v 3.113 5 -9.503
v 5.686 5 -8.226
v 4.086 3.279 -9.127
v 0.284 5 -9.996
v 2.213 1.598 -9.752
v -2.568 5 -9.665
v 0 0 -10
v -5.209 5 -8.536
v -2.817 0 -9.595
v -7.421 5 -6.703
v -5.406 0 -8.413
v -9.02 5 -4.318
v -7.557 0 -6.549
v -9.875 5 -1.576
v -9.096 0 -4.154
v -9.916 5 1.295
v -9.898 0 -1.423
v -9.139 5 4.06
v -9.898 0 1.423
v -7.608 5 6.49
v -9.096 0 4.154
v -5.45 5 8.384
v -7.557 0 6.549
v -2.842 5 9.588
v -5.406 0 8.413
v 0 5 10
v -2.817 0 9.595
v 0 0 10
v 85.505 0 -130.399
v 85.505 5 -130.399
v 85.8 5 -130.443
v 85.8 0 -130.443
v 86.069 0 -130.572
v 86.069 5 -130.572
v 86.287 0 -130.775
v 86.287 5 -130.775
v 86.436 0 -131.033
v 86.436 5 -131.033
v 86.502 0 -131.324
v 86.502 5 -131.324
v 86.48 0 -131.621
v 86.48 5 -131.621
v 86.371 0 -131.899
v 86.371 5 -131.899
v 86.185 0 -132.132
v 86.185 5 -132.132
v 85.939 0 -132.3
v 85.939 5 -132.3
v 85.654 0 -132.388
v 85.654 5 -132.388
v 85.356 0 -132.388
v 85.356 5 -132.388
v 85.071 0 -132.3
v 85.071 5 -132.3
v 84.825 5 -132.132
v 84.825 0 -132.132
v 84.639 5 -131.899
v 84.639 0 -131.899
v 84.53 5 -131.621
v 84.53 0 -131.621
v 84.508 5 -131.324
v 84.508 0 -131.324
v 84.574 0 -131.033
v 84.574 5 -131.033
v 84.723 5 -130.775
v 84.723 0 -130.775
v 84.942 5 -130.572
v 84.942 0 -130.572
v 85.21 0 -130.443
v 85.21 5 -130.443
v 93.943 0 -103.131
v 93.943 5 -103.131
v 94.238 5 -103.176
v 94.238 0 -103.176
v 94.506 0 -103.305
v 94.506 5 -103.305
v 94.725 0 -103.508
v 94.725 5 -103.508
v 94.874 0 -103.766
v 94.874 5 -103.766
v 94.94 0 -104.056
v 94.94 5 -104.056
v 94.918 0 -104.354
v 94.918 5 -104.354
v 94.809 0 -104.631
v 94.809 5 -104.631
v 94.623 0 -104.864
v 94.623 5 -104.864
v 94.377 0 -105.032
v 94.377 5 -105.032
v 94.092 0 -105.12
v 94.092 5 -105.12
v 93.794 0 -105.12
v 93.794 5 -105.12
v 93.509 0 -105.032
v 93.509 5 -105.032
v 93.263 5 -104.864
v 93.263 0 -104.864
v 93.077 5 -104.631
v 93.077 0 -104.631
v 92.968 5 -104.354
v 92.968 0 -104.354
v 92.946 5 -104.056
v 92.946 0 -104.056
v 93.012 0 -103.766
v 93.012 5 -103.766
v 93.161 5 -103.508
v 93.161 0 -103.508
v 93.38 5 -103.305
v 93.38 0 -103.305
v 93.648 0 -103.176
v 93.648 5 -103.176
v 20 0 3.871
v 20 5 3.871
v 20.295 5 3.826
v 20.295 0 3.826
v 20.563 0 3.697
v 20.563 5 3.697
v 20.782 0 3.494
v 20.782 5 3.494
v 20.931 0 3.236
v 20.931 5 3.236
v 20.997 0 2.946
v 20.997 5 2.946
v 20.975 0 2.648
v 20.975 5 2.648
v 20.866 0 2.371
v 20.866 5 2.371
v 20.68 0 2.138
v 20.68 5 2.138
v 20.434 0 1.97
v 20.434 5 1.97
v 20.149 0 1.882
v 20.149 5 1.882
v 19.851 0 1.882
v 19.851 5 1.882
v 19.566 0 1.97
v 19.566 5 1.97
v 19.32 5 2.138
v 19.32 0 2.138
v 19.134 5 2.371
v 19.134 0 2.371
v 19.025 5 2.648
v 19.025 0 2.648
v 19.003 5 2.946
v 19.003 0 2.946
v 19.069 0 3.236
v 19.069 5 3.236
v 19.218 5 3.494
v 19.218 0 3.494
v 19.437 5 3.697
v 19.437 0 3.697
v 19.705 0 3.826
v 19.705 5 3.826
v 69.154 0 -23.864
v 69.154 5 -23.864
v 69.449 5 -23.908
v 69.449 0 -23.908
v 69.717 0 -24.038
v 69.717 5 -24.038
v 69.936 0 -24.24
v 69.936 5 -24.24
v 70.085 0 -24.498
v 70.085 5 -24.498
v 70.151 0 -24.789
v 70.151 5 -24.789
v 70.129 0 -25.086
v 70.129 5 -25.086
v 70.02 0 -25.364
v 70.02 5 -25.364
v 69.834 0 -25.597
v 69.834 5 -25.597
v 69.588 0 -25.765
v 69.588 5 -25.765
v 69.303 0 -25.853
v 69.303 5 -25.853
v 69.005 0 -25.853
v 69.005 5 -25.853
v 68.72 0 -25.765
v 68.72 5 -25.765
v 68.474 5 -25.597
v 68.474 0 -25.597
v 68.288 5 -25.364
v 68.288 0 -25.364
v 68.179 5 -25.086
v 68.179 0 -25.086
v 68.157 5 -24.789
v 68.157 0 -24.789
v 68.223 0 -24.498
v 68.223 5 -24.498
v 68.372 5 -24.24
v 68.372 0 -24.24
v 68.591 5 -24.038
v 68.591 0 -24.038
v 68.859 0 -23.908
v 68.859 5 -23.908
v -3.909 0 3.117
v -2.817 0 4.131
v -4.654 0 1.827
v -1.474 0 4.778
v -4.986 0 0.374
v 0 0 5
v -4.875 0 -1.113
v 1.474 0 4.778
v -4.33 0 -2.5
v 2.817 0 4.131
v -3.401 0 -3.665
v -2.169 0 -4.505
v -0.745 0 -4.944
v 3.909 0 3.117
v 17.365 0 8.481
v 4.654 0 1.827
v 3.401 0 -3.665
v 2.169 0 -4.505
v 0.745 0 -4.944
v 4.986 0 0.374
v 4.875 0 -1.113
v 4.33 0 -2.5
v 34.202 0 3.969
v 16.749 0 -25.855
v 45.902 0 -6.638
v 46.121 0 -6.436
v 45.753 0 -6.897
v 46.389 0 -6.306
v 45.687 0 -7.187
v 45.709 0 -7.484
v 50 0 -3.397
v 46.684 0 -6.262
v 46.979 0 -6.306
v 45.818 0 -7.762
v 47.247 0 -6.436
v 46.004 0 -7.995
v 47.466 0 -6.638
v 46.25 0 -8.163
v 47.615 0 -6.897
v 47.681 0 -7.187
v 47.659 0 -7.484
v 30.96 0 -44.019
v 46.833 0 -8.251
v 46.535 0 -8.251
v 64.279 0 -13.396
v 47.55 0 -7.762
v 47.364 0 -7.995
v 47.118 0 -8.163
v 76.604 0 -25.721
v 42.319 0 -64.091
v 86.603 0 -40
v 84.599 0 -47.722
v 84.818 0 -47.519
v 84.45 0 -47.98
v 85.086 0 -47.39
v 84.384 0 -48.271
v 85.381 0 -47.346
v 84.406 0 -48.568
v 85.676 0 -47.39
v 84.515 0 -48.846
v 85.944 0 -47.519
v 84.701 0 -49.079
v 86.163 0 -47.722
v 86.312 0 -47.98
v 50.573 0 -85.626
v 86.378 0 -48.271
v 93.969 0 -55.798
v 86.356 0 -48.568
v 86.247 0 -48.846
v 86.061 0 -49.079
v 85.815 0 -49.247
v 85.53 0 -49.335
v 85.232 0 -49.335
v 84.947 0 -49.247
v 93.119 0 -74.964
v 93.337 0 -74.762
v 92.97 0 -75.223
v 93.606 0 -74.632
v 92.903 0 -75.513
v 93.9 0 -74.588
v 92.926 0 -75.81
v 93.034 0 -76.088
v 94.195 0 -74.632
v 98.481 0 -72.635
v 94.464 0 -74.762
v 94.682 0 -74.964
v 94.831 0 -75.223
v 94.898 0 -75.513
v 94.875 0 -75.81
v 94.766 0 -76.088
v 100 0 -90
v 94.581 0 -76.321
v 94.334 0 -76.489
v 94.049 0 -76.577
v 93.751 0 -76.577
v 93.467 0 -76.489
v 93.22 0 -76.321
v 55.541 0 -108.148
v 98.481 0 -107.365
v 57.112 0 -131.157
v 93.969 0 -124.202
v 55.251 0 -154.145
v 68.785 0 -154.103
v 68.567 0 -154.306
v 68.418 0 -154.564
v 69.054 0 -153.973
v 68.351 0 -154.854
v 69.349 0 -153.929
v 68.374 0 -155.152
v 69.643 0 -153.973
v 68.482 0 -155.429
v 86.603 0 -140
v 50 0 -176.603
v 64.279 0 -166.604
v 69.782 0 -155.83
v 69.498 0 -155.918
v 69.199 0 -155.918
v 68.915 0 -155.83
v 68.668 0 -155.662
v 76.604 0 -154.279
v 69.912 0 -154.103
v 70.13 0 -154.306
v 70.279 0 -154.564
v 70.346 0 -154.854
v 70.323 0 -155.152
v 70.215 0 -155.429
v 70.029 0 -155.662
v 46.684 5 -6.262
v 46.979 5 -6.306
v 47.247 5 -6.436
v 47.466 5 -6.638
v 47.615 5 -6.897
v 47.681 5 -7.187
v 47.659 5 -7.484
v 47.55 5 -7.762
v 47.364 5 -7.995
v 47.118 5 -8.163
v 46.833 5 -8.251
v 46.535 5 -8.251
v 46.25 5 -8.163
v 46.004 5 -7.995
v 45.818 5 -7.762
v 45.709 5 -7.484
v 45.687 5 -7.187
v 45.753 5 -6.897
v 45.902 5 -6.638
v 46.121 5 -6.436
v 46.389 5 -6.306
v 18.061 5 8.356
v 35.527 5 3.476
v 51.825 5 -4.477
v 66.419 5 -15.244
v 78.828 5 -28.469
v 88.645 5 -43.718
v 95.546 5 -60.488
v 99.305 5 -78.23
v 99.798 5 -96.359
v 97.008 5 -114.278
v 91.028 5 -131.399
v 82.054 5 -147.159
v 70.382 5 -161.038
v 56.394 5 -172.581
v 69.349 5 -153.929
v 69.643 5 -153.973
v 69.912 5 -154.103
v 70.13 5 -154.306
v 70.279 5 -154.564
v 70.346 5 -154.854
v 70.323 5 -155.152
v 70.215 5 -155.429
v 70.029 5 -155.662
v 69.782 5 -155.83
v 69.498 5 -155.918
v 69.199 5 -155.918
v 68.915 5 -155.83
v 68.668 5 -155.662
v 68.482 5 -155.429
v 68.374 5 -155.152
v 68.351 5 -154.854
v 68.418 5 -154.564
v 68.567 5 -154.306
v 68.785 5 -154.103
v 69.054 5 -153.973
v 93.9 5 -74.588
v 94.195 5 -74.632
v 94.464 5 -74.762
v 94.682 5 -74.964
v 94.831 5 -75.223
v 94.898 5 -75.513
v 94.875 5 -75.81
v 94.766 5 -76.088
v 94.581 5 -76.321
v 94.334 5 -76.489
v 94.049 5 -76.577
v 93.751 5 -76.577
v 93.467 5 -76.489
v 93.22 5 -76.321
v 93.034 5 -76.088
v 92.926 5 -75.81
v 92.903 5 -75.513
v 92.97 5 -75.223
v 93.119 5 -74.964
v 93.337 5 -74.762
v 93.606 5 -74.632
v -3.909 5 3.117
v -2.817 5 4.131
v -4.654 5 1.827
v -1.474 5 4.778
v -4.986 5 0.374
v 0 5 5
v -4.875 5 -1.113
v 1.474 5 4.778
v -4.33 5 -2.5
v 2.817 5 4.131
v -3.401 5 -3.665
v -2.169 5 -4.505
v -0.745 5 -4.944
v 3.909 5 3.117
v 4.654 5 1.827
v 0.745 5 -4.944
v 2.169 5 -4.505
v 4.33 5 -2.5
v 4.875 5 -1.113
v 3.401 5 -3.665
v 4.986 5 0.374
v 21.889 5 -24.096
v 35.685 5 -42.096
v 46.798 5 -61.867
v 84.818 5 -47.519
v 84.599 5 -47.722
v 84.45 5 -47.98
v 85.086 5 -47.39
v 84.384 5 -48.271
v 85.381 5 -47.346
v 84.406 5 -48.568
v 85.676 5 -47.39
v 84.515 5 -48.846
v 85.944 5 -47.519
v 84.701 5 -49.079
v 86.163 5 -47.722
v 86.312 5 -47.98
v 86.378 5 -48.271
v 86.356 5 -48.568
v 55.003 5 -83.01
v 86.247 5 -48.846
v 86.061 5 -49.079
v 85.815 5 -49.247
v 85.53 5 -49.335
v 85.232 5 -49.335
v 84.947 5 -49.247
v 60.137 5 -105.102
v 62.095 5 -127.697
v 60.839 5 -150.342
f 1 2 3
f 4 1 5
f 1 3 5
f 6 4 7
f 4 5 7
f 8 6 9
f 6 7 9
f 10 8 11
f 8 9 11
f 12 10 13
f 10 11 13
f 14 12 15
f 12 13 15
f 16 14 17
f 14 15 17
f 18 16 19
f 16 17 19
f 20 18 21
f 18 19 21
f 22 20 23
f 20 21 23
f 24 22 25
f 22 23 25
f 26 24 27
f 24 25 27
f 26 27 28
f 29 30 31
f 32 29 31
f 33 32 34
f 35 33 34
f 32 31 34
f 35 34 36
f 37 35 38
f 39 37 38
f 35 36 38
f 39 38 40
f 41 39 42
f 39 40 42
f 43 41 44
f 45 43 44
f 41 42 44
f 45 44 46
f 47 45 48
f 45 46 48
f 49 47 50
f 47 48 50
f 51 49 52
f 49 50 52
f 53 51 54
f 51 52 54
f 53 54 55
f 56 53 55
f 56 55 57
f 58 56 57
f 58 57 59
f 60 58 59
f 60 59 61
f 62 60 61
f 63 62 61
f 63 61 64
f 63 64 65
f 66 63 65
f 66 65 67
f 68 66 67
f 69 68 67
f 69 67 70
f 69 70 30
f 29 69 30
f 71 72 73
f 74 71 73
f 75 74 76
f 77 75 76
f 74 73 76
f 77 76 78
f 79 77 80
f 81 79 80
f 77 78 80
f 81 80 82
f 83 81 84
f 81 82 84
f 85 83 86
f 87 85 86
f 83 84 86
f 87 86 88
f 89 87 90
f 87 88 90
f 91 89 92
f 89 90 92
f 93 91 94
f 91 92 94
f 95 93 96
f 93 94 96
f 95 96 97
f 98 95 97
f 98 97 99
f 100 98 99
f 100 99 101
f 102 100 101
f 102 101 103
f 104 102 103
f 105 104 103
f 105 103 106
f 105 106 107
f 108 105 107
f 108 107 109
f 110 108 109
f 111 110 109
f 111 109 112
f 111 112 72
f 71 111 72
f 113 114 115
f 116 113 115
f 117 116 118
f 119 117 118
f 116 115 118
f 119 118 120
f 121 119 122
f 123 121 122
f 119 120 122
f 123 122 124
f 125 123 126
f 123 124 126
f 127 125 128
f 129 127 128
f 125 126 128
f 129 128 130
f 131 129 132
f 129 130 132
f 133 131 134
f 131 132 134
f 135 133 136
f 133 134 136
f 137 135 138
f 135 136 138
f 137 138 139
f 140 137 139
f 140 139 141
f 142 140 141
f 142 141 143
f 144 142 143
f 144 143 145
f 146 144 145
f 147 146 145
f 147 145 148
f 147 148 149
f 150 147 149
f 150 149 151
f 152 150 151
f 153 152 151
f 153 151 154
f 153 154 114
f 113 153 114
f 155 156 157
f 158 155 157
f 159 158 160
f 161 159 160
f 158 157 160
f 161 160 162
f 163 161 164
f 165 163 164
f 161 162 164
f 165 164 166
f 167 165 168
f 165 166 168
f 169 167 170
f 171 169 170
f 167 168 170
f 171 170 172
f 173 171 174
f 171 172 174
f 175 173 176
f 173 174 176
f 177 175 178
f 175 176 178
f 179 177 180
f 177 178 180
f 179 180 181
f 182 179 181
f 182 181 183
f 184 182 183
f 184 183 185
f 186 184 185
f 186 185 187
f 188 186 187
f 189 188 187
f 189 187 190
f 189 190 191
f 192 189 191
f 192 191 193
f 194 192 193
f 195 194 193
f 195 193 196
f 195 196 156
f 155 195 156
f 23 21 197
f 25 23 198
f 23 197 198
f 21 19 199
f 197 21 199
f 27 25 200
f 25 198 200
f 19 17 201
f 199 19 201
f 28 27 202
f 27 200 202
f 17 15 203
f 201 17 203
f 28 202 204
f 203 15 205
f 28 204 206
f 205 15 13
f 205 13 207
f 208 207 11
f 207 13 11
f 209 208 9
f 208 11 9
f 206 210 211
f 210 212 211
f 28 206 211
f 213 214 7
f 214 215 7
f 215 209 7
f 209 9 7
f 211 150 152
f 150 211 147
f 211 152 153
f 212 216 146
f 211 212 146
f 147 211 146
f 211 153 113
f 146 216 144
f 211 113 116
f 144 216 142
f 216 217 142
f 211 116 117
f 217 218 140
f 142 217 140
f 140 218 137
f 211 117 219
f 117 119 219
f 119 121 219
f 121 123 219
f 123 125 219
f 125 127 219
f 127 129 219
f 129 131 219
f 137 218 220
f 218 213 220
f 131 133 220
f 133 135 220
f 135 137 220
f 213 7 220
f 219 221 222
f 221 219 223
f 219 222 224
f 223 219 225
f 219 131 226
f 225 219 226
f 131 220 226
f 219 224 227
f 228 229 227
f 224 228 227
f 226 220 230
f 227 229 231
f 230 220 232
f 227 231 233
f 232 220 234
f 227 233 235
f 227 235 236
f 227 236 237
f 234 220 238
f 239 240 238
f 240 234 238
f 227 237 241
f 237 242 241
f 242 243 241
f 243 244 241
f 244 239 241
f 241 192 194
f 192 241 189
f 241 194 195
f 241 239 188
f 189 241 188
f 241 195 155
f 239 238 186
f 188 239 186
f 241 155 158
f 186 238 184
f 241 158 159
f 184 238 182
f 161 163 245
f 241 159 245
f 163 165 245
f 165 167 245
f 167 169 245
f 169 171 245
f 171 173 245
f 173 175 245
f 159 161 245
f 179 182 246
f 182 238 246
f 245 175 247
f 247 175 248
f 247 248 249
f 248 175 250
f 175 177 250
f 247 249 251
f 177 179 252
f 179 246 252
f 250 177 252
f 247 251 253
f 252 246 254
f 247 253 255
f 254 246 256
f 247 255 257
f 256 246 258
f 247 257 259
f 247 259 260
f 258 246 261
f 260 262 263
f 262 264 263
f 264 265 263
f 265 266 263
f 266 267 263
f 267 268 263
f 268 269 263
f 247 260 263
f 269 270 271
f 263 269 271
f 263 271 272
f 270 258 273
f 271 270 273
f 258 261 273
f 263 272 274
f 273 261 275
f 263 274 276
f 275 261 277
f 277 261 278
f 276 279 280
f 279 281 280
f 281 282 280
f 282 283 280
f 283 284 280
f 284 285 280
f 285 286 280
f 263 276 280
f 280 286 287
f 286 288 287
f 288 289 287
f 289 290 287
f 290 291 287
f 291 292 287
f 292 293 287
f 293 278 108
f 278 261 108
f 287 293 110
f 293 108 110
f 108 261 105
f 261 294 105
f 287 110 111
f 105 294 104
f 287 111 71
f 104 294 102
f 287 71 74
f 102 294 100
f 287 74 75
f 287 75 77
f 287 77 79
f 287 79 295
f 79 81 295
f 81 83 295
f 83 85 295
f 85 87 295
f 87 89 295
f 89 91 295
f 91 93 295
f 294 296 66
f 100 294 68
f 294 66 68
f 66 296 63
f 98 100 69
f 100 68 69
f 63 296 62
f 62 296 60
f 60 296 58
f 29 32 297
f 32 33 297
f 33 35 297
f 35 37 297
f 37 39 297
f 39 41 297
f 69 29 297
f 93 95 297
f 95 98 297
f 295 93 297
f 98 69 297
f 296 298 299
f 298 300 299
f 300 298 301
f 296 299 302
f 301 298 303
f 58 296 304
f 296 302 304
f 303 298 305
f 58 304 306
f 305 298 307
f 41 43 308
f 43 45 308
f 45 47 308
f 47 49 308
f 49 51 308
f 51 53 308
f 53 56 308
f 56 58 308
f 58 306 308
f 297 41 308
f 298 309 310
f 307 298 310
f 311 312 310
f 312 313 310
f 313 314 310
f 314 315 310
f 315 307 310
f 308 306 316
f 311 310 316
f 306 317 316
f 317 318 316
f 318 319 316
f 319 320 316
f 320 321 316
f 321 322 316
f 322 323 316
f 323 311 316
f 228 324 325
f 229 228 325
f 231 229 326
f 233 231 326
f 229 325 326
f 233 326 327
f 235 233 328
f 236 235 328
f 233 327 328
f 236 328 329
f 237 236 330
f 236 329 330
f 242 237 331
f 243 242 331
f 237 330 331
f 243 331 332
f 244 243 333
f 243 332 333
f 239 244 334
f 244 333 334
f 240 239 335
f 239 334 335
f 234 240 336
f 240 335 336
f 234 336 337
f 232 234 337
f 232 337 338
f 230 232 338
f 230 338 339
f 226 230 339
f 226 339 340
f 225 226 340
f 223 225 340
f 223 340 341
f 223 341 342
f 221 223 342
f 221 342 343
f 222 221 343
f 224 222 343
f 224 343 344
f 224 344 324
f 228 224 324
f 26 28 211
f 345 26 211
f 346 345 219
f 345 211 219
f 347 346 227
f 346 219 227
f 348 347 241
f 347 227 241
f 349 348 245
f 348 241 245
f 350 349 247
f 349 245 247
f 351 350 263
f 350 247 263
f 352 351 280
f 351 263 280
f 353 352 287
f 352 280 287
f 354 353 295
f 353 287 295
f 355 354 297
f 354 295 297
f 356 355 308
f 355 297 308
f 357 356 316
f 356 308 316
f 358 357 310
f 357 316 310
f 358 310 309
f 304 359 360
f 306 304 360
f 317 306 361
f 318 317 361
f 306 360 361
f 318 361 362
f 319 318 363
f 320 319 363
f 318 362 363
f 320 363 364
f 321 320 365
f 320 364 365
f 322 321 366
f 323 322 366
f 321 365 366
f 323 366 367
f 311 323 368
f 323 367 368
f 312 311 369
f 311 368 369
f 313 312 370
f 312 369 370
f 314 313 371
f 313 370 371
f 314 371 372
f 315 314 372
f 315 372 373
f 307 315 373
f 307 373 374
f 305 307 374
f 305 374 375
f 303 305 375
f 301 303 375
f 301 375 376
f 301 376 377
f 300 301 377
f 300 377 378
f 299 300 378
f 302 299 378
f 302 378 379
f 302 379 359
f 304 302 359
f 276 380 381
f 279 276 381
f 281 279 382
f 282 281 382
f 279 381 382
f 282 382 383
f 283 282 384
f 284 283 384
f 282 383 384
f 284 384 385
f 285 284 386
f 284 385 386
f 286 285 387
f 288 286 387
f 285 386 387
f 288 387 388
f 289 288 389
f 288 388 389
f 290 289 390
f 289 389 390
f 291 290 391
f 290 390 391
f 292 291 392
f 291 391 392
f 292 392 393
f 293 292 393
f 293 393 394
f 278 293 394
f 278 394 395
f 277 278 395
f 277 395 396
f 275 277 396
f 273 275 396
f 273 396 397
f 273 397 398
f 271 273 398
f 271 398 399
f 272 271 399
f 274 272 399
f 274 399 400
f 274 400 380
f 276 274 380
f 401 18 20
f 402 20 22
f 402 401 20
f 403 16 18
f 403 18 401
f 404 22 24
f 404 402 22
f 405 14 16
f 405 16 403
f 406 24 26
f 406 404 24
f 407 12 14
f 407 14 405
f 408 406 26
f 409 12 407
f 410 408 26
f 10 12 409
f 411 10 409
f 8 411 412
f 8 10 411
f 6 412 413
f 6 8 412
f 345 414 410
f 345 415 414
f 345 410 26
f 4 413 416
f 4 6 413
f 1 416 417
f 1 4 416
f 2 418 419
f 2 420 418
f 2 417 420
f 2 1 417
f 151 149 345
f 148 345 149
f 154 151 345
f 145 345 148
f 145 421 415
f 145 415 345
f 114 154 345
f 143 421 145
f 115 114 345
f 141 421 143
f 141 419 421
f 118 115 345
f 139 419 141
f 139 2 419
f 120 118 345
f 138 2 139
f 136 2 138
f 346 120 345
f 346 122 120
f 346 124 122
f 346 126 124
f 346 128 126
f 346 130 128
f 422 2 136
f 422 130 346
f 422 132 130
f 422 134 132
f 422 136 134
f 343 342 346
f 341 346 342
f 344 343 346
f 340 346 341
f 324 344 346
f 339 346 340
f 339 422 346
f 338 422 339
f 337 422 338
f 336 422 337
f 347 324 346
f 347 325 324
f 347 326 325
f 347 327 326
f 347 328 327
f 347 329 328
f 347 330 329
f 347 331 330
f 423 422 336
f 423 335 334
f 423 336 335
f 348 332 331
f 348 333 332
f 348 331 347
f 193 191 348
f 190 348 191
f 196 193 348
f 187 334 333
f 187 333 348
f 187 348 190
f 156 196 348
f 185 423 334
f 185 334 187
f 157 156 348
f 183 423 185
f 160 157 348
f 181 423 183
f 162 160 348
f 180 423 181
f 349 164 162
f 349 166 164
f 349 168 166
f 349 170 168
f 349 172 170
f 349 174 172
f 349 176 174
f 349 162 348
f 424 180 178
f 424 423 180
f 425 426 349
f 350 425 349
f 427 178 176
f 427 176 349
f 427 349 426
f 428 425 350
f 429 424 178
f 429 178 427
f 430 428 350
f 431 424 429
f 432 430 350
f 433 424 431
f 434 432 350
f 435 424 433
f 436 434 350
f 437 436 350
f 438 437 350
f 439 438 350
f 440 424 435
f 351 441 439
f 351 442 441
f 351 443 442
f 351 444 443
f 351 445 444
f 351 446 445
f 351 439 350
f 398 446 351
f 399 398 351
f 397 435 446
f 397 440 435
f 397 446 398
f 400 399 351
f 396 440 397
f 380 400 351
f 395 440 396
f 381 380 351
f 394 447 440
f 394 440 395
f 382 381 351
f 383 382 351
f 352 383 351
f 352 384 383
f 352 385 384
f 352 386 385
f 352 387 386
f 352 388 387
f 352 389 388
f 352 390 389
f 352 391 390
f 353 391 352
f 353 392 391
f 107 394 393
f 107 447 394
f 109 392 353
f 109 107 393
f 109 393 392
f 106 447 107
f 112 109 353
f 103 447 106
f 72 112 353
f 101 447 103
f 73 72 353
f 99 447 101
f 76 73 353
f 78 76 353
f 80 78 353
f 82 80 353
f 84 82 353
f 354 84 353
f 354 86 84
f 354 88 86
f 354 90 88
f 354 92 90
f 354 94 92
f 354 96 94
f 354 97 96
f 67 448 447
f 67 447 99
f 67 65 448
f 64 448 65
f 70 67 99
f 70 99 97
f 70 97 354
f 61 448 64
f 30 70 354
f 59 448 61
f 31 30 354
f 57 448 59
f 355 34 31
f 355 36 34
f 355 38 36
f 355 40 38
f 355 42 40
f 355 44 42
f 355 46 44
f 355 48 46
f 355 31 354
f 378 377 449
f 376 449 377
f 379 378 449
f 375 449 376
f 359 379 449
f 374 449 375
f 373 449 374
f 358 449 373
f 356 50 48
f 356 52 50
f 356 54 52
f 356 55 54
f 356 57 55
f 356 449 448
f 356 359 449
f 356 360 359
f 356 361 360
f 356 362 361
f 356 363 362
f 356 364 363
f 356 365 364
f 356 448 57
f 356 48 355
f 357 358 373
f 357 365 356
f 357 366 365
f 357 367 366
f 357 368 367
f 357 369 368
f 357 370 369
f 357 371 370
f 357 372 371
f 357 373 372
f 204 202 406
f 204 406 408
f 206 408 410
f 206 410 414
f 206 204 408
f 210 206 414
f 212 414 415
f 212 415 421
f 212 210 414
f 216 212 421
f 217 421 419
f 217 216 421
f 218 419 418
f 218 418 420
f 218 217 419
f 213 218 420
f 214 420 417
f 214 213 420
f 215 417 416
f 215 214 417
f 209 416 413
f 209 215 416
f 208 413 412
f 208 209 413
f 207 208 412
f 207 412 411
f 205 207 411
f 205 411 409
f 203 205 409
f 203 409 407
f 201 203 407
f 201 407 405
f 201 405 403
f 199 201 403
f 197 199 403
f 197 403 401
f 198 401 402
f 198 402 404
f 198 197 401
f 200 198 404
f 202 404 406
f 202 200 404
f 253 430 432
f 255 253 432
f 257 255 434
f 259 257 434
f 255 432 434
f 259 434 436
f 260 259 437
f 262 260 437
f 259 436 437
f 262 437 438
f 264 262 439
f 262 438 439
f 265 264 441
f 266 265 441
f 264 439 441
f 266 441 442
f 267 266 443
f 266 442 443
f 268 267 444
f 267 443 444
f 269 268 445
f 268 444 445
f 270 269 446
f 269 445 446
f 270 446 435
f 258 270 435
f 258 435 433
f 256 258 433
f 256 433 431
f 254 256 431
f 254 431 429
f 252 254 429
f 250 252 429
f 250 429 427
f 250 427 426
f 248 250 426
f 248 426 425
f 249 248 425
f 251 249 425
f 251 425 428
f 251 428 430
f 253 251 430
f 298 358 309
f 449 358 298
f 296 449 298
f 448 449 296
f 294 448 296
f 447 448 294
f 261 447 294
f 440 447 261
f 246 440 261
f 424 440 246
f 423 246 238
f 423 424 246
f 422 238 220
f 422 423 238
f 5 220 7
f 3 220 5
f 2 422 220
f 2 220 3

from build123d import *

# Parameters (mm, degrees)
IZIM1_R                     = 10
IZIM1_R_2                   = 5
Y_KSEKLIK_EKSTR_ZYON1_DEPTH = 5
PAH1_SIZE                   = 5
IZIM2_R                     = 1
KANCA_DELIKLERI_DEPTH       = 204.010978335


with BuildPart() as part:
    # Çizim1 → Yükseklik-Ekstrüzyon1 (new body)
    # profile 1 of 2: a face of its own
    with BuildSketch(Plane(origin=(0, 0, 0), x_dir=(1, 0, 0), z_dir=(0, 1, 0))):
        Circle(IZIM1_R)
        with Locations(Location((0, 0, 0), (0, 0, 270))):
            Circle(IZIM1_R_2, mode=Mode.SUBTRACT)
    # profile 2 of 2: a face of its own
    with BuildSketch(Plane(origin=(0, 0, 0), x_dir=(1, 0, 0), z_dir=(0, 1, 0))):
        with BuildLine():
            ThreePointArc((2.57e-07, -10), (96.592582662, 64.118095614), (50, 176.602540378))
            ThreePointArc((50, 176.602540378), (50.573117628, 85.626381928), (0, 10))
            ThreePointArc((0, 10), (7.071067812, 7.071067812), (10, 0))
            ThreePointArc((10, 0), (7.071067903, -7.071067721), (2.57e-07, -10))
        make_face()
    extrude(amount=Y_KSEKLIK_EKSTR_ZYON1_DEPTH)

    # Pah1
    pah1_edges = [part.edges().sort_by_distance(p)[0] for p in [
        (50.573117628, 5, -85.626381928),
    ]]
    chamfer(pah1_edges, length=PAH1_SIZE - 0.0001)  # a hair under: the kernel refuses the full size

    # Çizim2 → kanca delikleri (cut, through all)
    with BuildSketch(Plane(origin=(0, 5, 0), x_dir=(1, 0, 0), z_dir=(0, 1, 0))):
        with Locations(Location((69.348523033, 154.929056309, 0), (0, 0, 270))):
            Circle(IZIM2_R)
        with Locations(Location((85.505252147, 131.398693884, 0), (0, 0, 270))):
            Circle(IZIM2_R)
        with Locations(Location((93.943127486, 104.131128696, 0), (0, 0, 270))):
            Circle(IZIM2_R)
        with Locations(Location((93.900432964, 75.587897823, 0), (0, 0, 270))):
            Circle(IZIM2_R)
        with Locations(Location((85.381022764, 48.345697079, 0), (0, 0, 270))):
            Circle(IZIM2_R)
        with Locations(Location((69.153973403, 24.863773807, 0), (0, 0, 270))):
            Circle(IZIM2_R)
        with Locations(Location((46.684156547, 7.261922143, 0), (0, 0, 270))):
            Circle(IZIM2_R)
        with Locations(Location((20, -2.870878105, 0), (0, 0, 270))):
            Circle(IZIM2_R)
    extrude(amount=-KANCA_DELIKLERI_DEPTH, mode=Mode.SUBTRACT)


solid = part.part
